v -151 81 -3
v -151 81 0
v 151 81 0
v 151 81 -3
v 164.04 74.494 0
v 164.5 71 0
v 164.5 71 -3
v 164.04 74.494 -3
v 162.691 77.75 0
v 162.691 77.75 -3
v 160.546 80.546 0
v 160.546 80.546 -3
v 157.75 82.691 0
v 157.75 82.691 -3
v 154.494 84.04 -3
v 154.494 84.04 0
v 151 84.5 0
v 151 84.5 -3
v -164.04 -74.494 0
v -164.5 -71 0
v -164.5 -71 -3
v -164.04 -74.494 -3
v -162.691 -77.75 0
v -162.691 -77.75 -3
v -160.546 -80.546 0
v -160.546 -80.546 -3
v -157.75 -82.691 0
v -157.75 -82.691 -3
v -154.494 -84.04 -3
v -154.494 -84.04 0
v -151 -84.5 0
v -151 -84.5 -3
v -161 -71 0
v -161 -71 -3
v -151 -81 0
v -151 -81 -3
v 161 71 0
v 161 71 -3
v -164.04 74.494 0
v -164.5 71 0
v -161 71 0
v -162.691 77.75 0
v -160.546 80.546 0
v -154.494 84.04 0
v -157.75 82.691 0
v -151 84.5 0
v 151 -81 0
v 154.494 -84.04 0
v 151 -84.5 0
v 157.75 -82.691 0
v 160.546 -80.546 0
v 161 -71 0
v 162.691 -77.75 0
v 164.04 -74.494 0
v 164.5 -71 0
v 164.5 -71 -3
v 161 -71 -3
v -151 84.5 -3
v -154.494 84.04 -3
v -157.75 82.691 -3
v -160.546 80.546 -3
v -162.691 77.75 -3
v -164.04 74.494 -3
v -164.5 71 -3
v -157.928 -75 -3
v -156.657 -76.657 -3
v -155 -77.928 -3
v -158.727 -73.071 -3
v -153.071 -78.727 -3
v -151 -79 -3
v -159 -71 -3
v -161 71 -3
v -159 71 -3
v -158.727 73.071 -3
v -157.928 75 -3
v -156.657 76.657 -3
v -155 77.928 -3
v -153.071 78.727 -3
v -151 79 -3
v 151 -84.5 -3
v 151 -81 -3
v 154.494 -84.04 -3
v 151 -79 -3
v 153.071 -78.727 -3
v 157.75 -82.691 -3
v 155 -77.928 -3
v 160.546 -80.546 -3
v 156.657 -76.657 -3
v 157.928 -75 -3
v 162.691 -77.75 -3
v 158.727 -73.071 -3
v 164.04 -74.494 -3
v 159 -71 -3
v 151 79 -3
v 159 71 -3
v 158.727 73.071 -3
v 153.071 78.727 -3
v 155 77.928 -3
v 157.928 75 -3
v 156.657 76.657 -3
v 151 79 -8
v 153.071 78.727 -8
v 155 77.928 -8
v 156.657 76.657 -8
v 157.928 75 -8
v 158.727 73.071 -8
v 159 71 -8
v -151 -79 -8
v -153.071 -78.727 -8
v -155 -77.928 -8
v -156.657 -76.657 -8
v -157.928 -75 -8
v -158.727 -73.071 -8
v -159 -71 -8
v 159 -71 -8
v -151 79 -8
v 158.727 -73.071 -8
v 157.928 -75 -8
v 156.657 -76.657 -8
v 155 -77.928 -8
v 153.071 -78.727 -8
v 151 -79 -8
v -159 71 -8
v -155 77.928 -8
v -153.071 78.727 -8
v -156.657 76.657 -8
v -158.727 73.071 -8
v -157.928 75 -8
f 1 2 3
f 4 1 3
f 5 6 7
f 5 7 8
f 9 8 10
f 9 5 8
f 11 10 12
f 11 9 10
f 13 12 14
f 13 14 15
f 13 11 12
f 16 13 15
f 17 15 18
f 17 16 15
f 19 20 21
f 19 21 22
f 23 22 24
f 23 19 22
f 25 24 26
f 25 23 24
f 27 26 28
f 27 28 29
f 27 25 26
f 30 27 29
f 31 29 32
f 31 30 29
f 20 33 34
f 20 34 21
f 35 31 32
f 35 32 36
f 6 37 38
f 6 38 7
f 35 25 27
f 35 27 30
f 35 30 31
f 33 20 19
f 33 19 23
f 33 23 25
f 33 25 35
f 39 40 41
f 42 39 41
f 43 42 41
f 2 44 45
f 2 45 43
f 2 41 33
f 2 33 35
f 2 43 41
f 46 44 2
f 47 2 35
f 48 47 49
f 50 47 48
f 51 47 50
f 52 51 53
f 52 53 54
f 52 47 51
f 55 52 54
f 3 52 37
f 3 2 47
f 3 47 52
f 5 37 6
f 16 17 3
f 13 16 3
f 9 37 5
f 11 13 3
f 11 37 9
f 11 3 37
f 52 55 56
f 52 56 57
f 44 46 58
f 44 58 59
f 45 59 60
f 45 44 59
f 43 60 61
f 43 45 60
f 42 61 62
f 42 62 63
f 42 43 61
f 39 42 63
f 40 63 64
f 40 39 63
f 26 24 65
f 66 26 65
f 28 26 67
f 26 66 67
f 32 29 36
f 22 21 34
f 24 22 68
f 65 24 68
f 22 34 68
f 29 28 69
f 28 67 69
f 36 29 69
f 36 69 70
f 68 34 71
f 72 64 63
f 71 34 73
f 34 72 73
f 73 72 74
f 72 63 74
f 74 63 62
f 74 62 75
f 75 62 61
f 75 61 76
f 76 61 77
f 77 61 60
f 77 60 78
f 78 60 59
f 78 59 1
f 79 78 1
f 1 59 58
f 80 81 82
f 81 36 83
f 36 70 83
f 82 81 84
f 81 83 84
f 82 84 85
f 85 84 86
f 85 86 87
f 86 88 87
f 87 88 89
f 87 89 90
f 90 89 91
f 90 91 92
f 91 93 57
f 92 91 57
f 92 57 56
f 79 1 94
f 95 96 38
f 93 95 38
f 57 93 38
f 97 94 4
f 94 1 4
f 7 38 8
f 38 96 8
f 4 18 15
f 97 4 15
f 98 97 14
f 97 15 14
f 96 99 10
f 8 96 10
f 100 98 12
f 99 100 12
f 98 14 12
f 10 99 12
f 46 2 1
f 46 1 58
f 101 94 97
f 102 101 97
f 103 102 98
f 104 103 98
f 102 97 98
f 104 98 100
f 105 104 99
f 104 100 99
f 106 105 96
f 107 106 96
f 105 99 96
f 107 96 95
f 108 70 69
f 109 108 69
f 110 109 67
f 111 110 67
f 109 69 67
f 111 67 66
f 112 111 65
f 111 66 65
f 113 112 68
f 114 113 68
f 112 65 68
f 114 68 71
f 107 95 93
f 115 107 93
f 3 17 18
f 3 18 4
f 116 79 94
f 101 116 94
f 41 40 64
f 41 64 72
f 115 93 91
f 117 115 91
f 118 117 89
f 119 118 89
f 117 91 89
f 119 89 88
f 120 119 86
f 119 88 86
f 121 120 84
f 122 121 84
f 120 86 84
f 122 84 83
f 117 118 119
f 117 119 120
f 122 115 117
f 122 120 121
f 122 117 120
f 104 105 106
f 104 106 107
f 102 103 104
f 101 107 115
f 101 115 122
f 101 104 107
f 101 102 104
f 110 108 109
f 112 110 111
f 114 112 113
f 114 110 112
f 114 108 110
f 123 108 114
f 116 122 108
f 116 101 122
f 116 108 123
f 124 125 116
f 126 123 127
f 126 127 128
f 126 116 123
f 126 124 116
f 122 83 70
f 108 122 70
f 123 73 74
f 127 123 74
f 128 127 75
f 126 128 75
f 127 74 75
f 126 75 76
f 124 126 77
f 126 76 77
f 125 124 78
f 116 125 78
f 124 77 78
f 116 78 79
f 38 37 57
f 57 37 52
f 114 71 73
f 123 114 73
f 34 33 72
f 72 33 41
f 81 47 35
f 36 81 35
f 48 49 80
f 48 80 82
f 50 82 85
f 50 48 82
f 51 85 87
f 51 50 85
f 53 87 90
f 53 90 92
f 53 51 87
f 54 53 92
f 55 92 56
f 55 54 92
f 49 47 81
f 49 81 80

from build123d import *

# Parameters (mm, degrees)
BOSS_EXTRUDE2_DEPTH = 3
EXTRUDE_1_DEPTH     = 5
EXTRUDE_2_DEPTH     = 3


with BuildPart() as part:
    # Sketch3 → Boss-Extrude2 (new body)
    with BuildSketch(Plane.XY):
        with BuildLine():
            Line((-151, 81), (151, 81))
            ThreePointArc((151, 81), (158.071067812, 78.071067812), (161, 71))
            Line((161, 71), (161, -71))
            ThreePointArc((161, -71), (158.071067812, -78.071067812), (151, -81))
            Line((151, -81), (-151, -81))
            ThreePointArc((-151, -81), (-158.071067812, -78.071067812), (-161, -71))
            Line((-161, -71), (-161, 71))
            ThreePointArc((-161, 71), (-158.071067812, 78.071067812), (-151, 81))
        make_face()
    extrude(amount=-BOSS_EXTRUDE2_DEPTH)

    # Эскиз1 → Бобышка-Вытянуть1 (add)
    with BuildSketch(Plane(origin=(0, 0, -3), x_dir=(-1, 0, 0), z_dir=(0, 0, -1))):
        with BuildLine():
            Line((-151, -79), (151, -79))
            ThreePointArc((151, -79), (156.656854249, -76.656854249), (159, -71))
            Line((159, -71), (159, 71))
            ThreePointArc((159, 71), (156.656854249, 76.656854249), (151, 79))
            Line((151, 79), (-151, 79))
            ThreePointArc((-151, 79), (-156.656854249, 76.656854249), (-159, 71))
            Line((-159, 71), (-159, -71))
            ThreePointArc((-159, -71), (-156.656854249, -76.656854249), (-151, -79))
        make_face()
    extrude(amount=EXTRUDE_1_DEPTH)

    # Эскиз2 → Бобышка-Вытянуть2 (add)
    with BuildSketch(Plane.XY):
        with BuildLine():
            Line((-164.5, 71), (-151, 71))
            Line((-151, 71), (-151, 84.5))
            ThreePointArc((-151, 84.5), (-160.545941546, 80.545941546), (-164.5, 71))
        make_face()
        with BuildLine():
            Line((164.5, -71), (151, -71))
            Line((151, -71), (151, -84.5))
            ThreePointArc((151, -84.5), (160.545941546, -80.545941546), (164.5, -71))
        make_face()
        with BuildLine():
            Line((-151, -84.5), (-151, -71))
            Line((-151, -71), (-164.5, -71))
            ThreePointArc((-164.5, -71), (-160.545941546, -80.545941546), (-151, -84.5))
        make_face()
        with BuildLine():
            Line((151, 84.5), (151, 71))
            Line((151, 71), (164.5, 71))
            ThreePointArc((164.5, 71), (160.545941546, 80.545941546), (151, 84.5))
        make_face()
    extrude(amount=-EXTRUDE_2_DEPTH)


solid = part.part
